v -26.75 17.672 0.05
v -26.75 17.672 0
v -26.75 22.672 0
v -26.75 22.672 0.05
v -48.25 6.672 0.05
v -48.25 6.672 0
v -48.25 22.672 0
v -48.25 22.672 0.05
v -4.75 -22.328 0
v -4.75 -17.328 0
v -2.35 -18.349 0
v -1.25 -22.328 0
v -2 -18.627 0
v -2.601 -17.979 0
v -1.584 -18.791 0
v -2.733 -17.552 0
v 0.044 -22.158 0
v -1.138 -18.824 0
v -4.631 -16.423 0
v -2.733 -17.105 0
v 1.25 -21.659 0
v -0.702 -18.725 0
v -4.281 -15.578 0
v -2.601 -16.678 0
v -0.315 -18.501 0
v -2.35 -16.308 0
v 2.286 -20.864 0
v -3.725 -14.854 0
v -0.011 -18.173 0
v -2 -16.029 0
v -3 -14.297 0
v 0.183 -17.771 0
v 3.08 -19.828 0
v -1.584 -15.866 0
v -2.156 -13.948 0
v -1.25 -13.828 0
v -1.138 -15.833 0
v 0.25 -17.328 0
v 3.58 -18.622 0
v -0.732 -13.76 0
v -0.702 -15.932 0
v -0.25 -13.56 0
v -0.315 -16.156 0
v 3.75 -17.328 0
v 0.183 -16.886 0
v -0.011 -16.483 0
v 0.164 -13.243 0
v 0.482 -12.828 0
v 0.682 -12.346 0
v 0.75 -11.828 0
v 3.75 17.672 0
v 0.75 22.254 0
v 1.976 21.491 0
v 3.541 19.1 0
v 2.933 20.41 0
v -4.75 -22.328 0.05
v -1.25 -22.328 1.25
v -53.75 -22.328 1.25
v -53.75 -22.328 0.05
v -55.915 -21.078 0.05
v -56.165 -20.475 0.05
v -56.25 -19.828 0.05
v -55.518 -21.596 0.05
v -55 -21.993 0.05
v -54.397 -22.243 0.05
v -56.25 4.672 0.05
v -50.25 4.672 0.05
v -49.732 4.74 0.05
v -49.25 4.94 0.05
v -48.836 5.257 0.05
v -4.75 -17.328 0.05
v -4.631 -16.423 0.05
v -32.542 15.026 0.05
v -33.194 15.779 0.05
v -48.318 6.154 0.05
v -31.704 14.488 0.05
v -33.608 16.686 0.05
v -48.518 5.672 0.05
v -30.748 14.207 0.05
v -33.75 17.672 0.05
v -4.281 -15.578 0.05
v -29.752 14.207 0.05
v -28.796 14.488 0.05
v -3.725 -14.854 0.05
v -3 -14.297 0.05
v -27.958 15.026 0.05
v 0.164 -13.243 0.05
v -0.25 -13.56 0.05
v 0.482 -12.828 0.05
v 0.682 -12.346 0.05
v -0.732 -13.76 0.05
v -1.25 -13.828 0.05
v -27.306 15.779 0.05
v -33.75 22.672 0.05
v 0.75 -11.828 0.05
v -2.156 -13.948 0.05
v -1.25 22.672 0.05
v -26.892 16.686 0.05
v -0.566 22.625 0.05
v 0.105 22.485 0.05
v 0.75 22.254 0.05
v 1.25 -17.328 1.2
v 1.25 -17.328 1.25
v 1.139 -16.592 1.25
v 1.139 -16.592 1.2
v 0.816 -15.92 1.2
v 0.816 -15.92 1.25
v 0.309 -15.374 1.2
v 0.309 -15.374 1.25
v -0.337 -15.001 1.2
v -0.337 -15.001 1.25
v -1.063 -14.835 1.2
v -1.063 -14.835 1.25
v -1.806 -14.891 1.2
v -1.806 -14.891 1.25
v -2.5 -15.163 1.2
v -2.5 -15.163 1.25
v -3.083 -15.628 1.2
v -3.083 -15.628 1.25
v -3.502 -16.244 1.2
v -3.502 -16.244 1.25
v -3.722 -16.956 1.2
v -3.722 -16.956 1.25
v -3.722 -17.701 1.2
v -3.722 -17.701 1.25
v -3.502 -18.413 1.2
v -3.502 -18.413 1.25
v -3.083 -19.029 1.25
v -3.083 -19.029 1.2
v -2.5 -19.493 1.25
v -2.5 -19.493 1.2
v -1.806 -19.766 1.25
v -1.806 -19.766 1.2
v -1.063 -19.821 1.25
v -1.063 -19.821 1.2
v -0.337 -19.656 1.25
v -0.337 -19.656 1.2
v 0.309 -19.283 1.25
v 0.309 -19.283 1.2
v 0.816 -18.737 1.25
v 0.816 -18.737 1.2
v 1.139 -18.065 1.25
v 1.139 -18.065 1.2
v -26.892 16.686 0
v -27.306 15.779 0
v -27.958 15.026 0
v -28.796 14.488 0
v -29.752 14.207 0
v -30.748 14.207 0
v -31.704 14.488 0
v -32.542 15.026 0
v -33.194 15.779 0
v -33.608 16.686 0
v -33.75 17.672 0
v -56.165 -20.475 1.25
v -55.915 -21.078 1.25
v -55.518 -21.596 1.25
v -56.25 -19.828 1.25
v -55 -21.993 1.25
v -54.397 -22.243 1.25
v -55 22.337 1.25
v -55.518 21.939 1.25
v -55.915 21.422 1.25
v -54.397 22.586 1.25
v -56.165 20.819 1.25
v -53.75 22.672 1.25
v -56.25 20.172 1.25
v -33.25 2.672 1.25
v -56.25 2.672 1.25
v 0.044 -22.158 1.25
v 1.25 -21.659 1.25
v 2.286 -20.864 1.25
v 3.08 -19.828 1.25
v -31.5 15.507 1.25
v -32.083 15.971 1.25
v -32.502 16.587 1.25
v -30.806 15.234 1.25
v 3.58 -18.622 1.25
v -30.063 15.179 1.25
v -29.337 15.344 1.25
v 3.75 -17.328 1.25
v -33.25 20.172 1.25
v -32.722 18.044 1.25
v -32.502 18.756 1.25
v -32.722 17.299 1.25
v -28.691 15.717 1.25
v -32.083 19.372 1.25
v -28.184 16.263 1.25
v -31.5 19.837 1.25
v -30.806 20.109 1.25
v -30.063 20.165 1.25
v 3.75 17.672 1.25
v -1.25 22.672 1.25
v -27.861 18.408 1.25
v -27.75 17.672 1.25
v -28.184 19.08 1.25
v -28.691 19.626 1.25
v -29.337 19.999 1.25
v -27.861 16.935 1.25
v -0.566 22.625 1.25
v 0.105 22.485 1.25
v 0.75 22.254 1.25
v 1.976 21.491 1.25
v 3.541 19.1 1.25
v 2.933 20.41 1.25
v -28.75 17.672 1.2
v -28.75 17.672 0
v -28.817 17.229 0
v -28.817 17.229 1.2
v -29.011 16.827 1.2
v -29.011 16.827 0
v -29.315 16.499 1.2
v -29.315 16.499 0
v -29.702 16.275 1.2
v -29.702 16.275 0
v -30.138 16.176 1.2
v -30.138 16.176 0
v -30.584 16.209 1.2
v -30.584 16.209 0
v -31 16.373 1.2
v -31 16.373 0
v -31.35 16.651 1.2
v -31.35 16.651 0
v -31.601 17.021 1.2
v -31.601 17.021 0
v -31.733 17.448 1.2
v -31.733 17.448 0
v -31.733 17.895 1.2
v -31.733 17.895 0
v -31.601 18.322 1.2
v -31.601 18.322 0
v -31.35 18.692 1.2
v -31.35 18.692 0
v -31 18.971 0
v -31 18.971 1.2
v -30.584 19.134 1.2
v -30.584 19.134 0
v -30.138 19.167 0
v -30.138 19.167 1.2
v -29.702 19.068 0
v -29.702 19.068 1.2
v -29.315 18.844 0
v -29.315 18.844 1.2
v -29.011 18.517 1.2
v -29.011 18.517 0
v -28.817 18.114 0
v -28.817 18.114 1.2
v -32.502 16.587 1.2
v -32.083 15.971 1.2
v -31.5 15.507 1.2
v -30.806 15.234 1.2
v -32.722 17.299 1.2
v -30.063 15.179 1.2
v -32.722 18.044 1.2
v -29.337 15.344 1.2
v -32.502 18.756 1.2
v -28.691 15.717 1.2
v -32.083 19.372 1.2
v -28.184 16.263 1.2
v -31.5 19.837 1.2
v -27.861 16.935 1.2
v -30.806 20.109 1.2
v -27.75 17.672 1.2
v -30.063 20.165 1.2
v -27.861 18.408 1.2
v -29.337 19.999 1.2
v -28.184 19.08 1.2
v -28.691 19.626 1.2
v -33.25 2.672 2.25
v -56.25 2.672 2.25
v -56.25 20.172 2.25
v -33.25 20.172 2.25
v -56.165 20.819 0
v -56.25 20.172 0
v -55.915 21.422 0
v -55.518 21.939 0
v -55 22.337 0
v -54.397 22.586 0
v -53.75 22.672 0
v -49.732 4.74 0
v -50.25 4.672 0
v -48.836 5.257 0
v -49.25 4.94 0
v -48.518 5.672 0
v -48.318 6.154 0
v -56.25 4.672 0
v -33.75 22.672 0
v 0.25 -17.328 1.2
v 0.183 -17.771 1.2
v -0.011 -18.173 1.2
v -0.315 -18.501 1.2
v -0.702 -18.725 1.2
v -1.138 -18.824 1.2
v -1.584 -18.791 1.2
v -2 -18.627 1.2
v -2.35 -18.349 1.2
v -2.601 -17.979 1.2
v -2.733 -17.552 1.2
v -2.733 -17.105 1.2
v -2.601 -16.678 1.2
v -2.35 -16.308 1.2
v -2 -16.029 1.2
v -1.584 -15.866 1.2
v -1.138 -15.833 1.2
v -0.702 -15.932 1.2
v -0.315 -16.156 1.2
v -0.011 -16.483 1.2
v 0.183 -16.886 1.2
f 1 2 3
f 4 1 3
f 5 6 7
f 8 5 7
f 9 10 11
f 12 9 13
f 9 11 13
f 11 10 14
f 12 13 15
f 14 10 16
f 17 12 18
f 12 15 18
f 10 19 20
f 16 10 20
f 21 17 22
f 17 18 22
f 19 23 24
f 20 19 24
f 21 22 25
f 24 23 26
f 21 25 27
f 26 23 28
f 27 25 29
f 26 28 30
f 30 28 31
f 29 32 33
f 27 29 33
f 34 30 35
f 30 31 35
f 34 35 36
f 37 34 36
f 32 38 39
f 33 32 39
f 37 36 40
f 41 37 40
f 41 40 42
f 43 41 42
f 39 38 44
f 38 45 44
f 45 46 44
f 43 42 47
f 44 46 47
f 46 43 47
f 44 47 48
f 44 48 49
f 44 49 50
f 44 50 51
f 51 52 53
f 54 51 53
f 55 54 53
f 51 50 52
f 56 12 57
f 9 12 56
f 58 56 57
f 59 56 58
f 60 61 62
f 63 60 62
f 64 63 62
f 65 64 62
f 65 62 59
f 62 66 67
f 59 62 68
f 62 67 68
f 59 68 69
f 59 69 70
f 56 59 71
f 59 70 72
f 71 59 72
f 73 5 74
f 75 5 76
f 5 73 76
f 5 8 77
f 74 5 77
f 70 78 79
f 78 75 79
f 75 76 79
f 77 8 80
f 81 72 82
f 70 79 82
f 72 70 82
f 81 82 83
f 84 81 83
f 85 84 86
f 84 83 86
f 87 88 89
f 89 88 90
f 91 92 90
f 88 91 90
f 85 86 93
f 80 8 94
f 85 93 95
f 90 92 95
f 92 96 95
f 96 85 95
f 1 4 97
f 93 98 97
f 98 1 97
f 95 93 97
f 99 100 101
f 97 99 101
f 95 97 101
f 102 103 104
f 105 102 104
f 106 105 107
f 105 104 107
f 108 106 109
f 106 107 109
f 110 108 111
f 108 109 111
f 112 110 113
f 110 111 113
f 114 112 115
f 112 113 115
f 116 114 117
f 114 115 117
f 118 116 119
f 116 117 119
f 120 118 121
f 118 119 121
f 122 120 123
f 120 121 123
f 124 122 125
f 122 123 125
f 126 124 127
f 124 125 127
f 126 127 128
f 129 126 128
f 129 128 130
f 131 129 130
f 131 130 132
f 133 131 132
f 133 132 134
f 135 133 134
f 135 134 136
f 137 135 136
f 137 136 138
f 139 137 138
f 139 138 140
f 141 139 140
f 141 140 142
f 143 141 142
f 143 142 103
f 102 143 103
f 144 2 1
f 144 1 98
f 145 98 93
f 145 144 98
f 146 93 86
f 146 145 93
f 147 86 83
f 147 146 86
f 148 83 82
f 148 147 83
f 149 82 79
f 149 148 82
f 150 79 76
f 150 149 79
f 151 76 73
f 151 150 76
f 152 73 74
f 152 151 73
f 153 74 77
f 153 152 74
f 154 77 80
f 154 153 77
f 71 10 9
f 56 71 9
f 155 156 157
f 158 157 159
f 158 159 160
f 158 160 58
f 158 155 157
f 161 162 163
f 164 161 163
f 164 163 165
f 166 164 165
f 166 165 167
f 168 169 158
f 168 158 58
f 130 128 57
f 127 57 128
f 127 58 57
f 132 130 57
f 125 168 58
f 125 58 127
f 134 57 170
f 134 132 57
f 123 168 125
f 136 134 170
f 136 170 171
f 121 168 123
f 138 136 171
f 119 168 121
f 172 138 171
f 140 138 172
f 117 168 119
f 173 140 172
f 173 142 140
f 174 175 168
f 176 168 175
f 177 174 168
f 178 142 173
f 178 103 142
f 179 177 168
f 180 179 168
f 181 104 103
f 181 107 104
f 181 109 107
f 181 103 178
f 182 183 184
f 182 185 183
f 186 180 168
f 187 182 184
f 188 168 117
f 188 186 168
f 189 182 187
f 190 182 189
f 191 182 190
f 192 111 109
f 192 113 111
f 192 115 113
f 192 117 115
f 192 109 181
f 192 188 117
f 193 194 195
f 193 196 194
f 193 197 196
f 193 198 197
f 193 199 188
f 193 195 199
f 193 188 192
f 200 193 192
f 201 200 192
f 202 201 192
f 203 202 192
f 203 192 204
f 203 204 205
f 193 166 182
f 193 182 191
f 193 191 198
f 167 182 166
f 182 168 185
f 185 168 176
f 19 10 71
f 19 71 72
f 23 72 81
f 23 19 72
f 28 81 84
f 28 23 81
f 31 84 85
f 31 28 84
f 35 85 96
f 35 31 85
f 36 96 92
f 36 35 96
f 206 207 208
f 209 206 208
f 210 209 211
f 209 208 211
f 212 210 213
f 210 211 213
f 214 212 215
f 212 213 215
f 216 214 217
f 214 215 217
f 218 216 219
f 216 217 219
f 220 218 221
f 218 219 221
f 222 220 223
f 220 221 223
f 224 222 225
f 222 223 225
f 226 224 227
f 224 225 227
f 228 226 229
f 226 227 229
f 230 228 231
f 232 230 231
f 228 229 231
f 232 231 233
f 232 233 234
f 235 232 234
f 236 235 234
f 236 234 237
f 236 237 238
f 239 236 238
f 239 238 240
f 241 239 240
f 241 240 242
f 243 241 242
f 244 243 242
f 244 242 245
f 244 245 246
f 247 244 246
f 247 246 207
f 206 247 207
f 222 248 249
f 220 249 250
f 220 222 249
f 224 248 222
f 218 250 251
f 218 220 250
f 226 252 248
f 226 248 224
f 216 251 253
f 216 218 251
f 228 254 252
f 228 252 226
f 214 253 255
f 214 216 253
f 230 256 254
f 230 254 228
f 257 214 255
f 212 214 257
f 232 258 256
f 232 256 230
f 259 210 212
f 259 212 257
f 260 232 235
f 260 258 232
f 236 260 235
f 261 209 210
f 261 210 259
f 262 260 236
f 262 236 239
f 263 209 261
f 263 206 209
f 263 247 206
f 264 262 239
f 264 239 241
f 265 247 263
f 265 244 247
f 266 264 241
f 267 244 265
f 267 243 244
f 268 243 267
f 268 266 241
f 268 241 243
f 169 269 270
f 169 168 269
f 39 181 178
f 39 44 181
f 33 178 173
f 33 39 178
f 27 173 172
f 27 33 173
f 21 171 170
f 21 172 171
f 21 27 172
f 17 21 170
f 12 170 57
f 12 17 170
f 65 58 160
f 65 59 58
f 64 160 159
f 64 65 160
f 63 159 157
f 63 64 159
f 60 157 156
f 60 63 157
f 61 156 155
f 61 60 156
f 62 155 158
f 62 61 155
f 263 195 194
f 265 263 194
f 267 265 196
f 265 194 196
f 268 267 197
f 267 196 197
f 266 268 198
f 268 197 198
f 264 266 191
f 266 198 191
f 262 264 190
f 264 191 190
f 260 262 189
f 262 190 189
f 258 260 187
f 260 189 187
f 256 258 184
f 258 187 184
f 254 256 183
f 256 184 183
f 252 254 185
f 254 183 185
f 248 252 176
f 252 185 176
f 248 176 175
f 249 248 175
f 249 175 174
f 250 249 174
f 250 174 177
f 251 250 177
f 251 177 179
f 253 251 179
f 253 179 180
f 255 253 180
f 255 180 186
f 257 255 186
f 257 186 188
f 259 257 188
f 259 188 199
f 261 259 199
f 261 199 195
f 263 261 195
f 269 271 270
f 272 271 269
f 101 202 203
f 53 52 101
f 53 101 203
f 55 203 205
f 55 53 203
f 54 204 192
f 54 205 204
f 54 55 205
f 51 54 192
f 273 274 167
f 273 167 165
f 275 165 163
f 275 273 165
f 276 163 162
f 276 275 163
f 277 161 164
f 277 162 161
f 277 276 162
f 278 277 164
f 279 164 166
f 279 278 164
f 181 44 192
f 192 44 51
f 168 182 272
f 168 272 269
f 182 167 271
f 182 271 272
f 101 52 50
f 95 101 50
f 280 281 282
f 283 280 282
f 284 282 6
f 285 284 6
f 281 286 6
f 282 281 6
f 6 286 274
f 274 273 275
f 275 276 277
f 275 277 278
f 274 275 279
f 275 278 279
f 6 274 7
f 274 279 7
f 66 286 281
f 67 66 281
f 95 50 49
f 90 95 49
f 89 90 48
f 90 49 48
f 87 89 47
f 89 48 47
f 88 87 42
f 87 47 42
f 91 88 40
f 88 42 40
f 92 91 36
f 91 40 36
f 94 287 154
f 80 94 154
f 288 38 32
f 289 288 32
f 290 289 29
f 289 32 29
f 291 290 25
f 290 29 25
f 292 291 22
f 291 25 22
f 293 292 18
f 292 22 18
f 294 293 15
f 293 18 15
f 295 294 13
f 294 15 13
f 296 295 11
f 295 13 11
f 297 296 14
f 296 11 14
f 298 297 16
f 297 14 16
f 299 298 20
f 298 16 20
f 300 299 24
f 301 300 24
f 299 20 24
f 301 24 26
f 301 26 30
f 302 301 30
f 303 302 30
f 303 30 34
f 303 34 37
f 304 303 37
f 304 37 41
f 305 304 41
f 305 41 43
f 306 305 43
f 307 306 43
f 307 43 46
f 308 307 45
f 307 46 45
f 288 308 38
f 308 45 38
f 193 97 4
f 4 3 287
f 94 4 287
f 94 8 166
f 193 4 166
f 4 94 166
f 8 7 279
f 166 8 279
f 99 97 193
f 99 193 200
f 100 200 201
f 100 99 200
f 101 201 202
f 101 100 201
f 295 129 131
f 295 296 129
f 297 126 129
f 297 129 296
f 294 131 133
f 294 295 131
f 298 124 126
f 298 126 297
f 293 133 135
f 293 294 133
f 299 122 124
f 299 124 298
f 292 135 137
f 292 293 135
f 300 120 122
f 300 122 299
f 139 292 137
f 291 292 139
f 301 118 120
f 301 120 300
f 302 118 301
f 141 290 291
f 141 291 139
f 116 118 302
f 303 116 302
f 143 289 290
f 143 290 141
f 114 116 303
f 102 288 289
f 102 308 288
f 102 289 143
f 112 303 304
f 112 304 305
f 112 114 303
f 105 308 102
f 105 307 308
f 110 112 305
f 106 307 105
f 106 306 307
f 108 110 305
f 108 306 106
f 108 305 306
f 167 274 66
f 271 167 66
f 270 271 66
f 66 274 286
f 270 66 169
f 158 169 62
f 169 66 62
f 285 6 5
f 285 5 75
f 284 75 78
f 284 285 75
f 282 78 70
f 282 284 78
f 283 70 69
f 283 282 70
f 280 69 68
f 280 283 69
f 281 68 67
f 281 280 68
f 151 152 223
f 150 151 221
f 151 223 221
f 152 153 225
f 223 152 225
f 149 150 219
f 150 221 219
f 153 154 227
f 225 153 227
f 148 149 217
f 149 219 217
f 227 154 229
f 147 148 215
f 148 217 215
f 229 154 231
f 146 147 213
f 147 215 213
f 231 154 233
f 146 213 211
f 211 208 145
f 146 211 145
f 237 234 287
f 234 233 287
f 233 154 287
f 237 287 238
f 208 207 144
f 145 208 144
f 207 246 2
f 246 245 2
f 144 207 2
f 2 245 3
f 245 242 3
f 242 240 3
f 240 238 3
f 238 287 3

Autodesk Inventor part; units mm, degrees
ref_plane "YZ Plane" through (0, 0, 0) normal (1, 0, 0) x (0, 1, 0)
ref_plane "XZ Plane" through (0, 0, 0) normal (0, 1, 0) x (-1, 0, 0)
ref_plane "XY Plane" through (0, 0, 0) normal (0, 0, 1) x (1, 0, 0)
sketch "Sketch1" plane through (0, 0, 0) normal (0, 0, 1) x (1, 0, 0)
  line L0 (10.25, 20.1716) -> (10.25, 23.6716) projected
  line L1 (-1.25, 23.6716) -> (10.25, 23.6716) projected
  arc A0 (0.75, 23.3284) -> (-1.25, 23.6716) centre (-1.25, 17.6716) ccw projected
  line L2 (0.75, 23.3284) -> (0.75, -11.8284) projected
  arc A1 (-1.25, -13.8284) -> (0.75, -11.8284) centre (-1.25, -11.8284) ccw projected
  arc A2 (-1.25, -13.8284) -> (-4.75, -17.3284) centre (-1.25, -17.3284) ccw projected
  line L3 (-4.75, -17.3284) -> (-4.75, -23.3284) projected
  line L4 (10.25, -23.3284) -> (-4.75, -23.3284) projected
  line L5 (10.25, -23.3284) -> (10.25, -19.8284) projected
  line L6 (10.25, -19.8284) -> (6.75, -19.8284) projected
  line L7 (6.75, -19.8284) -> (6.75, 8.1716) projected
  line L8 (6.75, 8.1716) -> (16.75, 8.1716) projected
  line L9 (16.75, 17.1716) -> (16.75, 8.1716) projected
  line L10 (16.75, 17.1716) -> (13.25, 17.1716) projected
  arc A3 (10.25, 20.1716) -> (13.25, 17.1716) centre (13.25, 20.1716) ccw projected
  circle A4 centre (-1.25, -17.3284) radius 1.5 projected
  line L11 (-57.25, 4.6716) -> (-57.25, 20.1716) projected
  line L12 (-57.25, 4.6716) -> (-50.25, 4.6716) projected
  arc A5 (-50.25, 4.6716) -> (-48.25, 6.6716) centre (-50.25, 6.6716) ccw projected
  line L13 (-48.25, 6.6716) -> (-48.25, 23.6716) projected
  line L14 (-53.75, 23.6716) -> (-48.25, 23.6716) projected
  arc A6 (-53.75, 23.6716) -> (-57.25, 20.1716) centre (-53.75, 20.1716) ccw projected
  line L15 (-26.75, 17.6716) -> (-26.75, 23.6716) projected
  line L16 (-33.75, 23.6716) -> (-26.75, 23.6716) projected
  line L17 (-33.75, 23.6716) -> (-33.75, 17.6716) projected
  arc A7 (-33.75, 17.6716) -> (-26.75, 17.6716) centre (-30.25, 17.6716) ccw projected
  circle A8 centre (-30.25, 17.6716) radius 1.5 projected
  line L18 (-50.25, 4.6716) -> (-57.25, 4.6716) projected
  line L19 (-57.25, -19.8284) -> (-57.25, 4.6716) projected
  arc A9 (-57.25, -19.8284) -> (-53.75, -23.3284) centre (-53.75, -19.8284) ccw projected
  line L20 (-4.75, -23.3284) -> (-53.75, -23.3284) projected
  line L21 (-4.75, -23.3284) -> (-4.75, -17.3284) projected
  arc A10 (-1.25, -13.8284) -> (-4.75, -17.3284) centre (-1.25, -17.3284) ccw projected
  arc A11 (-1.25, -13.8284) -> (0.75, -11.8284) centre (-1.25, -11.8284) ccw projected
  line L22 (0.75, -11.8284) -> (0.75, 23.3284) projected
  arc A12 (0.75, 23.3284) -> (-1.25, 23.6716) centre (-1.25, 17.6716) ccw projected
  line L23 (-26.75, 23.6716) -> (-1.25, 23.6716) projected
  line L24 (-26.75, 23.6716) -> (-26.75, 17.6716) projected
  arc A13 (-33.75, 17.6716) -> (-26.75, 17.6716) centre (-30.25, 17.6716) ccw projected
  line L25 (-33.75, 17.6716) -> (-33.75, 23.6716) projected
  line L26 (-48.25, 23.6716) -> (-33.75, 23.6716) projected
  line L27 (-48.25, 23.6716) -> (-48.25, 6.6716) projected
  arc A14 (-50.25, 4.6716) -> (-48.25, 6.6716) centre (-50.25, 6.6716) ccw projected
  line L28 (-1.25, -17.3284) -> (-53.75, -17.3284) construction
  line L29 (-53.75, -17.3284) -> (-53.75, 20.1716) construction
  line L30 (-53.75, 20.1716) -> (-1.25, 20.1716) construction
  line L31 (-1.25, 20.1716) -> (-1.25, -17.3284) construction
  arc A15 (-1.25, -22.3284) -> (3.75, -17.3284) centre (-1.25, -17.3284) ccw
  line L32 (-1.25, -22.3284) -> (-4.75, -22.3284)
  line L33 (3.75, -17.3284) -> (3.75, 17.6716)
  arc A16 (3.75, 17.6716) -> (0.75, 22.2541) centre (-1.25, 17.6716) ccw
  line L34 (-56.25, 4.6716) -> (-56.25, 20.1716)
  line L35 (-48.25, 22.6716) -> (-53.75, 22.6716)
  arc A17 (-53.75, 22.6716) -> (-56.25, 20.1716) centre (-53.75, 20.1716) ccw
  line L36 (-26.75, 22.6716) -> (-33.75, 22.6716)
  point P0 (0, 0)
  dimension "d0" = 5
  dimension "d1" = 2.5
extrude "Extrusion1" add sketch "Sketch1" along normal blind 0.05 contours A16 L33 A15 L32 L3 A2 A1 L2 | L15 A7 L17 L36 | L13 A5 L12 L34 A17 L35
sketch "Sketch2" plane through (0, 0, 0.05) normal (0, 0, 1) x (1, 0, 0)
  arc A0 (3.75, 17.6716) -> (0.75, 22.2541) centre (-1.25, 17.6716) ccw projected
  line L0 (0.75, 22.2541) -> (0.75, -11.8284) projected
  arc A1 (-1.25, -13.8284) -> (0.75, -11.8284) centre (-1.25, -11.8284) ccw projected
  arc A2 (-1.25, -13.8284) -> (-4.75, -17.3284) centre (-1.25, -17.3284) ccw projected
  line L1 (-4.75, -17.3284) -> (-4.75, -22.3284) projected
  line L2 (-4.75, -22.3284) -> (-1.25, -22.3284) projected
  arc A3 (-1.25, -22.3284) -> (3.75, -17.3284) centre (-1.25, -17.3284) ccw projected
  line L3 (3.75, -17.3284) -> (3.75, 17.6716) projected
  circle A4 centre (-1.25, -17.3284) radius 1.5 projected
  line L4 (-56.25, 20.1716) -> (-56.25, 4.6716) projected
  line L5 (-56.25, 4.6716) -> (-50.25, 4.6716) projected
  arc A5 (-50.25, 4.6716) -> (-48.25, 6.6716) centre (-50.25, 6.6716) ccw projected
  line L6 (-48.25, 6.6716) -> (-48.25, 22.6716) projected
  line L7 (-48.25, 22.6716) -> (-53.75, 22.6716) projected
  arc A6 (-53.75, 22.6716) -> (-56.25, 20.1716) centre (-53.75, 20.1716) ccw projected
  arc A7 (0.75, 22.2541) -> (-1.25, 22.6716) centre (-1.25, 17.6716) ccw
  line L8 (-1.25, 22.6716) -> (-48.25, 22.6716)
  arc A8 (-57.1041, -20.8284) -> (-53.75, -23.3284) centre (-53.75, -19.8284) ccw projected
  arc A9 (-56.25, -19.8284) -> (-53.75, -22.3284) centre (-53.75, -19.8284) ccw
  line L9 (-4.75, -22.3284) -> (-53.75, -22.3284)
  line L10 (-56.25, -19.8284) -> (-56.25, 4.6716)
  circle A10 centre (-30.25, 17.6716) radius 1.5 projected
  point P0 (0, 0)
extrude "Extrusion2" add sketch "Sketch2" along normal blind 1.2
sketch "Sketch3" plane through (0, 0, 1.25) normal (0, 0, 1) x (1, 0, 0)
  arc A0 (-56.25, -19.8284) -> (-53.75, -22.3284) centre (-53.75, -19.8284) ccw projected
  line L0 (-53.75, -22.3284) -> (-1.25, -22.3284) projected
  arc A1 (-1.25, -22.3284) -> (3.75, -17.3284) centre (-1.25, -17.3284) ccw projected
  line L1 (3.75, -17.3284) -> (3.75, 17.6716) projected
  arc A2 (3.75, 17.6716) -> (-1.25, 22.6716) centre (-1.25, 17.6716) ccw projected
  line L2 (-1.25, 22.6716) -> (-53.75, 22.6716) projected
  arc A3 (-53.75, 22.6716) -> (-56.25, 20.1716) centre (-53.75, 20.1716) ccw projected
  line L3 (-56.25, 20.1716) -> (-56.25, -19.8284) projected
  circle A4 centre (-1.25, -17.3284) radius 1.5 projected
  circle A5 centre (-30.25, 17.6716) radius 1.5 projected
  circle A6 centre (-1.25, -17.3284) radius 1.5 projected
  circle A7 centre (-1.25, -17.3284) radius 2.5
  circle A8 centre (-30.25, 17.6716) radius 2.5
  point P0 (0, 0)
  dimension "d6" = 5
  dimension "d7" = 5
extrude "Extrusion3" cut sketch "Sketch3" against normal blind 0.05 contours A4 | A5 | A7 | A8
sketch "Sketch4" plane through (0, 0, 1.25) normal (0, 0, 1) x (1, 0, 0)
  line L0 (-56.25, 20.1716) -> (-56.25, -19.8284) projected
  line L1 (-56.25, 20.1716) -> (-33.25, 20.1716)
  line L2 (-33.25, 20.1716) -> (-33.25, 2.6716)
  line L3 (-33.25, 2.6716) -> (-56.25, 2.6716)
  line L4 (-56.25, 2.6716) -> (-56.25, 20.1716)
  point P0 (0, 0)
  point P1 (-56.25, 2.6716)
  dimension "d10" = 17.5
  dimension "d11" = 23
extrude "Extrusion4" add sketch "Sketch4" along normal blind 1
properties material "Phenolic Resin"
